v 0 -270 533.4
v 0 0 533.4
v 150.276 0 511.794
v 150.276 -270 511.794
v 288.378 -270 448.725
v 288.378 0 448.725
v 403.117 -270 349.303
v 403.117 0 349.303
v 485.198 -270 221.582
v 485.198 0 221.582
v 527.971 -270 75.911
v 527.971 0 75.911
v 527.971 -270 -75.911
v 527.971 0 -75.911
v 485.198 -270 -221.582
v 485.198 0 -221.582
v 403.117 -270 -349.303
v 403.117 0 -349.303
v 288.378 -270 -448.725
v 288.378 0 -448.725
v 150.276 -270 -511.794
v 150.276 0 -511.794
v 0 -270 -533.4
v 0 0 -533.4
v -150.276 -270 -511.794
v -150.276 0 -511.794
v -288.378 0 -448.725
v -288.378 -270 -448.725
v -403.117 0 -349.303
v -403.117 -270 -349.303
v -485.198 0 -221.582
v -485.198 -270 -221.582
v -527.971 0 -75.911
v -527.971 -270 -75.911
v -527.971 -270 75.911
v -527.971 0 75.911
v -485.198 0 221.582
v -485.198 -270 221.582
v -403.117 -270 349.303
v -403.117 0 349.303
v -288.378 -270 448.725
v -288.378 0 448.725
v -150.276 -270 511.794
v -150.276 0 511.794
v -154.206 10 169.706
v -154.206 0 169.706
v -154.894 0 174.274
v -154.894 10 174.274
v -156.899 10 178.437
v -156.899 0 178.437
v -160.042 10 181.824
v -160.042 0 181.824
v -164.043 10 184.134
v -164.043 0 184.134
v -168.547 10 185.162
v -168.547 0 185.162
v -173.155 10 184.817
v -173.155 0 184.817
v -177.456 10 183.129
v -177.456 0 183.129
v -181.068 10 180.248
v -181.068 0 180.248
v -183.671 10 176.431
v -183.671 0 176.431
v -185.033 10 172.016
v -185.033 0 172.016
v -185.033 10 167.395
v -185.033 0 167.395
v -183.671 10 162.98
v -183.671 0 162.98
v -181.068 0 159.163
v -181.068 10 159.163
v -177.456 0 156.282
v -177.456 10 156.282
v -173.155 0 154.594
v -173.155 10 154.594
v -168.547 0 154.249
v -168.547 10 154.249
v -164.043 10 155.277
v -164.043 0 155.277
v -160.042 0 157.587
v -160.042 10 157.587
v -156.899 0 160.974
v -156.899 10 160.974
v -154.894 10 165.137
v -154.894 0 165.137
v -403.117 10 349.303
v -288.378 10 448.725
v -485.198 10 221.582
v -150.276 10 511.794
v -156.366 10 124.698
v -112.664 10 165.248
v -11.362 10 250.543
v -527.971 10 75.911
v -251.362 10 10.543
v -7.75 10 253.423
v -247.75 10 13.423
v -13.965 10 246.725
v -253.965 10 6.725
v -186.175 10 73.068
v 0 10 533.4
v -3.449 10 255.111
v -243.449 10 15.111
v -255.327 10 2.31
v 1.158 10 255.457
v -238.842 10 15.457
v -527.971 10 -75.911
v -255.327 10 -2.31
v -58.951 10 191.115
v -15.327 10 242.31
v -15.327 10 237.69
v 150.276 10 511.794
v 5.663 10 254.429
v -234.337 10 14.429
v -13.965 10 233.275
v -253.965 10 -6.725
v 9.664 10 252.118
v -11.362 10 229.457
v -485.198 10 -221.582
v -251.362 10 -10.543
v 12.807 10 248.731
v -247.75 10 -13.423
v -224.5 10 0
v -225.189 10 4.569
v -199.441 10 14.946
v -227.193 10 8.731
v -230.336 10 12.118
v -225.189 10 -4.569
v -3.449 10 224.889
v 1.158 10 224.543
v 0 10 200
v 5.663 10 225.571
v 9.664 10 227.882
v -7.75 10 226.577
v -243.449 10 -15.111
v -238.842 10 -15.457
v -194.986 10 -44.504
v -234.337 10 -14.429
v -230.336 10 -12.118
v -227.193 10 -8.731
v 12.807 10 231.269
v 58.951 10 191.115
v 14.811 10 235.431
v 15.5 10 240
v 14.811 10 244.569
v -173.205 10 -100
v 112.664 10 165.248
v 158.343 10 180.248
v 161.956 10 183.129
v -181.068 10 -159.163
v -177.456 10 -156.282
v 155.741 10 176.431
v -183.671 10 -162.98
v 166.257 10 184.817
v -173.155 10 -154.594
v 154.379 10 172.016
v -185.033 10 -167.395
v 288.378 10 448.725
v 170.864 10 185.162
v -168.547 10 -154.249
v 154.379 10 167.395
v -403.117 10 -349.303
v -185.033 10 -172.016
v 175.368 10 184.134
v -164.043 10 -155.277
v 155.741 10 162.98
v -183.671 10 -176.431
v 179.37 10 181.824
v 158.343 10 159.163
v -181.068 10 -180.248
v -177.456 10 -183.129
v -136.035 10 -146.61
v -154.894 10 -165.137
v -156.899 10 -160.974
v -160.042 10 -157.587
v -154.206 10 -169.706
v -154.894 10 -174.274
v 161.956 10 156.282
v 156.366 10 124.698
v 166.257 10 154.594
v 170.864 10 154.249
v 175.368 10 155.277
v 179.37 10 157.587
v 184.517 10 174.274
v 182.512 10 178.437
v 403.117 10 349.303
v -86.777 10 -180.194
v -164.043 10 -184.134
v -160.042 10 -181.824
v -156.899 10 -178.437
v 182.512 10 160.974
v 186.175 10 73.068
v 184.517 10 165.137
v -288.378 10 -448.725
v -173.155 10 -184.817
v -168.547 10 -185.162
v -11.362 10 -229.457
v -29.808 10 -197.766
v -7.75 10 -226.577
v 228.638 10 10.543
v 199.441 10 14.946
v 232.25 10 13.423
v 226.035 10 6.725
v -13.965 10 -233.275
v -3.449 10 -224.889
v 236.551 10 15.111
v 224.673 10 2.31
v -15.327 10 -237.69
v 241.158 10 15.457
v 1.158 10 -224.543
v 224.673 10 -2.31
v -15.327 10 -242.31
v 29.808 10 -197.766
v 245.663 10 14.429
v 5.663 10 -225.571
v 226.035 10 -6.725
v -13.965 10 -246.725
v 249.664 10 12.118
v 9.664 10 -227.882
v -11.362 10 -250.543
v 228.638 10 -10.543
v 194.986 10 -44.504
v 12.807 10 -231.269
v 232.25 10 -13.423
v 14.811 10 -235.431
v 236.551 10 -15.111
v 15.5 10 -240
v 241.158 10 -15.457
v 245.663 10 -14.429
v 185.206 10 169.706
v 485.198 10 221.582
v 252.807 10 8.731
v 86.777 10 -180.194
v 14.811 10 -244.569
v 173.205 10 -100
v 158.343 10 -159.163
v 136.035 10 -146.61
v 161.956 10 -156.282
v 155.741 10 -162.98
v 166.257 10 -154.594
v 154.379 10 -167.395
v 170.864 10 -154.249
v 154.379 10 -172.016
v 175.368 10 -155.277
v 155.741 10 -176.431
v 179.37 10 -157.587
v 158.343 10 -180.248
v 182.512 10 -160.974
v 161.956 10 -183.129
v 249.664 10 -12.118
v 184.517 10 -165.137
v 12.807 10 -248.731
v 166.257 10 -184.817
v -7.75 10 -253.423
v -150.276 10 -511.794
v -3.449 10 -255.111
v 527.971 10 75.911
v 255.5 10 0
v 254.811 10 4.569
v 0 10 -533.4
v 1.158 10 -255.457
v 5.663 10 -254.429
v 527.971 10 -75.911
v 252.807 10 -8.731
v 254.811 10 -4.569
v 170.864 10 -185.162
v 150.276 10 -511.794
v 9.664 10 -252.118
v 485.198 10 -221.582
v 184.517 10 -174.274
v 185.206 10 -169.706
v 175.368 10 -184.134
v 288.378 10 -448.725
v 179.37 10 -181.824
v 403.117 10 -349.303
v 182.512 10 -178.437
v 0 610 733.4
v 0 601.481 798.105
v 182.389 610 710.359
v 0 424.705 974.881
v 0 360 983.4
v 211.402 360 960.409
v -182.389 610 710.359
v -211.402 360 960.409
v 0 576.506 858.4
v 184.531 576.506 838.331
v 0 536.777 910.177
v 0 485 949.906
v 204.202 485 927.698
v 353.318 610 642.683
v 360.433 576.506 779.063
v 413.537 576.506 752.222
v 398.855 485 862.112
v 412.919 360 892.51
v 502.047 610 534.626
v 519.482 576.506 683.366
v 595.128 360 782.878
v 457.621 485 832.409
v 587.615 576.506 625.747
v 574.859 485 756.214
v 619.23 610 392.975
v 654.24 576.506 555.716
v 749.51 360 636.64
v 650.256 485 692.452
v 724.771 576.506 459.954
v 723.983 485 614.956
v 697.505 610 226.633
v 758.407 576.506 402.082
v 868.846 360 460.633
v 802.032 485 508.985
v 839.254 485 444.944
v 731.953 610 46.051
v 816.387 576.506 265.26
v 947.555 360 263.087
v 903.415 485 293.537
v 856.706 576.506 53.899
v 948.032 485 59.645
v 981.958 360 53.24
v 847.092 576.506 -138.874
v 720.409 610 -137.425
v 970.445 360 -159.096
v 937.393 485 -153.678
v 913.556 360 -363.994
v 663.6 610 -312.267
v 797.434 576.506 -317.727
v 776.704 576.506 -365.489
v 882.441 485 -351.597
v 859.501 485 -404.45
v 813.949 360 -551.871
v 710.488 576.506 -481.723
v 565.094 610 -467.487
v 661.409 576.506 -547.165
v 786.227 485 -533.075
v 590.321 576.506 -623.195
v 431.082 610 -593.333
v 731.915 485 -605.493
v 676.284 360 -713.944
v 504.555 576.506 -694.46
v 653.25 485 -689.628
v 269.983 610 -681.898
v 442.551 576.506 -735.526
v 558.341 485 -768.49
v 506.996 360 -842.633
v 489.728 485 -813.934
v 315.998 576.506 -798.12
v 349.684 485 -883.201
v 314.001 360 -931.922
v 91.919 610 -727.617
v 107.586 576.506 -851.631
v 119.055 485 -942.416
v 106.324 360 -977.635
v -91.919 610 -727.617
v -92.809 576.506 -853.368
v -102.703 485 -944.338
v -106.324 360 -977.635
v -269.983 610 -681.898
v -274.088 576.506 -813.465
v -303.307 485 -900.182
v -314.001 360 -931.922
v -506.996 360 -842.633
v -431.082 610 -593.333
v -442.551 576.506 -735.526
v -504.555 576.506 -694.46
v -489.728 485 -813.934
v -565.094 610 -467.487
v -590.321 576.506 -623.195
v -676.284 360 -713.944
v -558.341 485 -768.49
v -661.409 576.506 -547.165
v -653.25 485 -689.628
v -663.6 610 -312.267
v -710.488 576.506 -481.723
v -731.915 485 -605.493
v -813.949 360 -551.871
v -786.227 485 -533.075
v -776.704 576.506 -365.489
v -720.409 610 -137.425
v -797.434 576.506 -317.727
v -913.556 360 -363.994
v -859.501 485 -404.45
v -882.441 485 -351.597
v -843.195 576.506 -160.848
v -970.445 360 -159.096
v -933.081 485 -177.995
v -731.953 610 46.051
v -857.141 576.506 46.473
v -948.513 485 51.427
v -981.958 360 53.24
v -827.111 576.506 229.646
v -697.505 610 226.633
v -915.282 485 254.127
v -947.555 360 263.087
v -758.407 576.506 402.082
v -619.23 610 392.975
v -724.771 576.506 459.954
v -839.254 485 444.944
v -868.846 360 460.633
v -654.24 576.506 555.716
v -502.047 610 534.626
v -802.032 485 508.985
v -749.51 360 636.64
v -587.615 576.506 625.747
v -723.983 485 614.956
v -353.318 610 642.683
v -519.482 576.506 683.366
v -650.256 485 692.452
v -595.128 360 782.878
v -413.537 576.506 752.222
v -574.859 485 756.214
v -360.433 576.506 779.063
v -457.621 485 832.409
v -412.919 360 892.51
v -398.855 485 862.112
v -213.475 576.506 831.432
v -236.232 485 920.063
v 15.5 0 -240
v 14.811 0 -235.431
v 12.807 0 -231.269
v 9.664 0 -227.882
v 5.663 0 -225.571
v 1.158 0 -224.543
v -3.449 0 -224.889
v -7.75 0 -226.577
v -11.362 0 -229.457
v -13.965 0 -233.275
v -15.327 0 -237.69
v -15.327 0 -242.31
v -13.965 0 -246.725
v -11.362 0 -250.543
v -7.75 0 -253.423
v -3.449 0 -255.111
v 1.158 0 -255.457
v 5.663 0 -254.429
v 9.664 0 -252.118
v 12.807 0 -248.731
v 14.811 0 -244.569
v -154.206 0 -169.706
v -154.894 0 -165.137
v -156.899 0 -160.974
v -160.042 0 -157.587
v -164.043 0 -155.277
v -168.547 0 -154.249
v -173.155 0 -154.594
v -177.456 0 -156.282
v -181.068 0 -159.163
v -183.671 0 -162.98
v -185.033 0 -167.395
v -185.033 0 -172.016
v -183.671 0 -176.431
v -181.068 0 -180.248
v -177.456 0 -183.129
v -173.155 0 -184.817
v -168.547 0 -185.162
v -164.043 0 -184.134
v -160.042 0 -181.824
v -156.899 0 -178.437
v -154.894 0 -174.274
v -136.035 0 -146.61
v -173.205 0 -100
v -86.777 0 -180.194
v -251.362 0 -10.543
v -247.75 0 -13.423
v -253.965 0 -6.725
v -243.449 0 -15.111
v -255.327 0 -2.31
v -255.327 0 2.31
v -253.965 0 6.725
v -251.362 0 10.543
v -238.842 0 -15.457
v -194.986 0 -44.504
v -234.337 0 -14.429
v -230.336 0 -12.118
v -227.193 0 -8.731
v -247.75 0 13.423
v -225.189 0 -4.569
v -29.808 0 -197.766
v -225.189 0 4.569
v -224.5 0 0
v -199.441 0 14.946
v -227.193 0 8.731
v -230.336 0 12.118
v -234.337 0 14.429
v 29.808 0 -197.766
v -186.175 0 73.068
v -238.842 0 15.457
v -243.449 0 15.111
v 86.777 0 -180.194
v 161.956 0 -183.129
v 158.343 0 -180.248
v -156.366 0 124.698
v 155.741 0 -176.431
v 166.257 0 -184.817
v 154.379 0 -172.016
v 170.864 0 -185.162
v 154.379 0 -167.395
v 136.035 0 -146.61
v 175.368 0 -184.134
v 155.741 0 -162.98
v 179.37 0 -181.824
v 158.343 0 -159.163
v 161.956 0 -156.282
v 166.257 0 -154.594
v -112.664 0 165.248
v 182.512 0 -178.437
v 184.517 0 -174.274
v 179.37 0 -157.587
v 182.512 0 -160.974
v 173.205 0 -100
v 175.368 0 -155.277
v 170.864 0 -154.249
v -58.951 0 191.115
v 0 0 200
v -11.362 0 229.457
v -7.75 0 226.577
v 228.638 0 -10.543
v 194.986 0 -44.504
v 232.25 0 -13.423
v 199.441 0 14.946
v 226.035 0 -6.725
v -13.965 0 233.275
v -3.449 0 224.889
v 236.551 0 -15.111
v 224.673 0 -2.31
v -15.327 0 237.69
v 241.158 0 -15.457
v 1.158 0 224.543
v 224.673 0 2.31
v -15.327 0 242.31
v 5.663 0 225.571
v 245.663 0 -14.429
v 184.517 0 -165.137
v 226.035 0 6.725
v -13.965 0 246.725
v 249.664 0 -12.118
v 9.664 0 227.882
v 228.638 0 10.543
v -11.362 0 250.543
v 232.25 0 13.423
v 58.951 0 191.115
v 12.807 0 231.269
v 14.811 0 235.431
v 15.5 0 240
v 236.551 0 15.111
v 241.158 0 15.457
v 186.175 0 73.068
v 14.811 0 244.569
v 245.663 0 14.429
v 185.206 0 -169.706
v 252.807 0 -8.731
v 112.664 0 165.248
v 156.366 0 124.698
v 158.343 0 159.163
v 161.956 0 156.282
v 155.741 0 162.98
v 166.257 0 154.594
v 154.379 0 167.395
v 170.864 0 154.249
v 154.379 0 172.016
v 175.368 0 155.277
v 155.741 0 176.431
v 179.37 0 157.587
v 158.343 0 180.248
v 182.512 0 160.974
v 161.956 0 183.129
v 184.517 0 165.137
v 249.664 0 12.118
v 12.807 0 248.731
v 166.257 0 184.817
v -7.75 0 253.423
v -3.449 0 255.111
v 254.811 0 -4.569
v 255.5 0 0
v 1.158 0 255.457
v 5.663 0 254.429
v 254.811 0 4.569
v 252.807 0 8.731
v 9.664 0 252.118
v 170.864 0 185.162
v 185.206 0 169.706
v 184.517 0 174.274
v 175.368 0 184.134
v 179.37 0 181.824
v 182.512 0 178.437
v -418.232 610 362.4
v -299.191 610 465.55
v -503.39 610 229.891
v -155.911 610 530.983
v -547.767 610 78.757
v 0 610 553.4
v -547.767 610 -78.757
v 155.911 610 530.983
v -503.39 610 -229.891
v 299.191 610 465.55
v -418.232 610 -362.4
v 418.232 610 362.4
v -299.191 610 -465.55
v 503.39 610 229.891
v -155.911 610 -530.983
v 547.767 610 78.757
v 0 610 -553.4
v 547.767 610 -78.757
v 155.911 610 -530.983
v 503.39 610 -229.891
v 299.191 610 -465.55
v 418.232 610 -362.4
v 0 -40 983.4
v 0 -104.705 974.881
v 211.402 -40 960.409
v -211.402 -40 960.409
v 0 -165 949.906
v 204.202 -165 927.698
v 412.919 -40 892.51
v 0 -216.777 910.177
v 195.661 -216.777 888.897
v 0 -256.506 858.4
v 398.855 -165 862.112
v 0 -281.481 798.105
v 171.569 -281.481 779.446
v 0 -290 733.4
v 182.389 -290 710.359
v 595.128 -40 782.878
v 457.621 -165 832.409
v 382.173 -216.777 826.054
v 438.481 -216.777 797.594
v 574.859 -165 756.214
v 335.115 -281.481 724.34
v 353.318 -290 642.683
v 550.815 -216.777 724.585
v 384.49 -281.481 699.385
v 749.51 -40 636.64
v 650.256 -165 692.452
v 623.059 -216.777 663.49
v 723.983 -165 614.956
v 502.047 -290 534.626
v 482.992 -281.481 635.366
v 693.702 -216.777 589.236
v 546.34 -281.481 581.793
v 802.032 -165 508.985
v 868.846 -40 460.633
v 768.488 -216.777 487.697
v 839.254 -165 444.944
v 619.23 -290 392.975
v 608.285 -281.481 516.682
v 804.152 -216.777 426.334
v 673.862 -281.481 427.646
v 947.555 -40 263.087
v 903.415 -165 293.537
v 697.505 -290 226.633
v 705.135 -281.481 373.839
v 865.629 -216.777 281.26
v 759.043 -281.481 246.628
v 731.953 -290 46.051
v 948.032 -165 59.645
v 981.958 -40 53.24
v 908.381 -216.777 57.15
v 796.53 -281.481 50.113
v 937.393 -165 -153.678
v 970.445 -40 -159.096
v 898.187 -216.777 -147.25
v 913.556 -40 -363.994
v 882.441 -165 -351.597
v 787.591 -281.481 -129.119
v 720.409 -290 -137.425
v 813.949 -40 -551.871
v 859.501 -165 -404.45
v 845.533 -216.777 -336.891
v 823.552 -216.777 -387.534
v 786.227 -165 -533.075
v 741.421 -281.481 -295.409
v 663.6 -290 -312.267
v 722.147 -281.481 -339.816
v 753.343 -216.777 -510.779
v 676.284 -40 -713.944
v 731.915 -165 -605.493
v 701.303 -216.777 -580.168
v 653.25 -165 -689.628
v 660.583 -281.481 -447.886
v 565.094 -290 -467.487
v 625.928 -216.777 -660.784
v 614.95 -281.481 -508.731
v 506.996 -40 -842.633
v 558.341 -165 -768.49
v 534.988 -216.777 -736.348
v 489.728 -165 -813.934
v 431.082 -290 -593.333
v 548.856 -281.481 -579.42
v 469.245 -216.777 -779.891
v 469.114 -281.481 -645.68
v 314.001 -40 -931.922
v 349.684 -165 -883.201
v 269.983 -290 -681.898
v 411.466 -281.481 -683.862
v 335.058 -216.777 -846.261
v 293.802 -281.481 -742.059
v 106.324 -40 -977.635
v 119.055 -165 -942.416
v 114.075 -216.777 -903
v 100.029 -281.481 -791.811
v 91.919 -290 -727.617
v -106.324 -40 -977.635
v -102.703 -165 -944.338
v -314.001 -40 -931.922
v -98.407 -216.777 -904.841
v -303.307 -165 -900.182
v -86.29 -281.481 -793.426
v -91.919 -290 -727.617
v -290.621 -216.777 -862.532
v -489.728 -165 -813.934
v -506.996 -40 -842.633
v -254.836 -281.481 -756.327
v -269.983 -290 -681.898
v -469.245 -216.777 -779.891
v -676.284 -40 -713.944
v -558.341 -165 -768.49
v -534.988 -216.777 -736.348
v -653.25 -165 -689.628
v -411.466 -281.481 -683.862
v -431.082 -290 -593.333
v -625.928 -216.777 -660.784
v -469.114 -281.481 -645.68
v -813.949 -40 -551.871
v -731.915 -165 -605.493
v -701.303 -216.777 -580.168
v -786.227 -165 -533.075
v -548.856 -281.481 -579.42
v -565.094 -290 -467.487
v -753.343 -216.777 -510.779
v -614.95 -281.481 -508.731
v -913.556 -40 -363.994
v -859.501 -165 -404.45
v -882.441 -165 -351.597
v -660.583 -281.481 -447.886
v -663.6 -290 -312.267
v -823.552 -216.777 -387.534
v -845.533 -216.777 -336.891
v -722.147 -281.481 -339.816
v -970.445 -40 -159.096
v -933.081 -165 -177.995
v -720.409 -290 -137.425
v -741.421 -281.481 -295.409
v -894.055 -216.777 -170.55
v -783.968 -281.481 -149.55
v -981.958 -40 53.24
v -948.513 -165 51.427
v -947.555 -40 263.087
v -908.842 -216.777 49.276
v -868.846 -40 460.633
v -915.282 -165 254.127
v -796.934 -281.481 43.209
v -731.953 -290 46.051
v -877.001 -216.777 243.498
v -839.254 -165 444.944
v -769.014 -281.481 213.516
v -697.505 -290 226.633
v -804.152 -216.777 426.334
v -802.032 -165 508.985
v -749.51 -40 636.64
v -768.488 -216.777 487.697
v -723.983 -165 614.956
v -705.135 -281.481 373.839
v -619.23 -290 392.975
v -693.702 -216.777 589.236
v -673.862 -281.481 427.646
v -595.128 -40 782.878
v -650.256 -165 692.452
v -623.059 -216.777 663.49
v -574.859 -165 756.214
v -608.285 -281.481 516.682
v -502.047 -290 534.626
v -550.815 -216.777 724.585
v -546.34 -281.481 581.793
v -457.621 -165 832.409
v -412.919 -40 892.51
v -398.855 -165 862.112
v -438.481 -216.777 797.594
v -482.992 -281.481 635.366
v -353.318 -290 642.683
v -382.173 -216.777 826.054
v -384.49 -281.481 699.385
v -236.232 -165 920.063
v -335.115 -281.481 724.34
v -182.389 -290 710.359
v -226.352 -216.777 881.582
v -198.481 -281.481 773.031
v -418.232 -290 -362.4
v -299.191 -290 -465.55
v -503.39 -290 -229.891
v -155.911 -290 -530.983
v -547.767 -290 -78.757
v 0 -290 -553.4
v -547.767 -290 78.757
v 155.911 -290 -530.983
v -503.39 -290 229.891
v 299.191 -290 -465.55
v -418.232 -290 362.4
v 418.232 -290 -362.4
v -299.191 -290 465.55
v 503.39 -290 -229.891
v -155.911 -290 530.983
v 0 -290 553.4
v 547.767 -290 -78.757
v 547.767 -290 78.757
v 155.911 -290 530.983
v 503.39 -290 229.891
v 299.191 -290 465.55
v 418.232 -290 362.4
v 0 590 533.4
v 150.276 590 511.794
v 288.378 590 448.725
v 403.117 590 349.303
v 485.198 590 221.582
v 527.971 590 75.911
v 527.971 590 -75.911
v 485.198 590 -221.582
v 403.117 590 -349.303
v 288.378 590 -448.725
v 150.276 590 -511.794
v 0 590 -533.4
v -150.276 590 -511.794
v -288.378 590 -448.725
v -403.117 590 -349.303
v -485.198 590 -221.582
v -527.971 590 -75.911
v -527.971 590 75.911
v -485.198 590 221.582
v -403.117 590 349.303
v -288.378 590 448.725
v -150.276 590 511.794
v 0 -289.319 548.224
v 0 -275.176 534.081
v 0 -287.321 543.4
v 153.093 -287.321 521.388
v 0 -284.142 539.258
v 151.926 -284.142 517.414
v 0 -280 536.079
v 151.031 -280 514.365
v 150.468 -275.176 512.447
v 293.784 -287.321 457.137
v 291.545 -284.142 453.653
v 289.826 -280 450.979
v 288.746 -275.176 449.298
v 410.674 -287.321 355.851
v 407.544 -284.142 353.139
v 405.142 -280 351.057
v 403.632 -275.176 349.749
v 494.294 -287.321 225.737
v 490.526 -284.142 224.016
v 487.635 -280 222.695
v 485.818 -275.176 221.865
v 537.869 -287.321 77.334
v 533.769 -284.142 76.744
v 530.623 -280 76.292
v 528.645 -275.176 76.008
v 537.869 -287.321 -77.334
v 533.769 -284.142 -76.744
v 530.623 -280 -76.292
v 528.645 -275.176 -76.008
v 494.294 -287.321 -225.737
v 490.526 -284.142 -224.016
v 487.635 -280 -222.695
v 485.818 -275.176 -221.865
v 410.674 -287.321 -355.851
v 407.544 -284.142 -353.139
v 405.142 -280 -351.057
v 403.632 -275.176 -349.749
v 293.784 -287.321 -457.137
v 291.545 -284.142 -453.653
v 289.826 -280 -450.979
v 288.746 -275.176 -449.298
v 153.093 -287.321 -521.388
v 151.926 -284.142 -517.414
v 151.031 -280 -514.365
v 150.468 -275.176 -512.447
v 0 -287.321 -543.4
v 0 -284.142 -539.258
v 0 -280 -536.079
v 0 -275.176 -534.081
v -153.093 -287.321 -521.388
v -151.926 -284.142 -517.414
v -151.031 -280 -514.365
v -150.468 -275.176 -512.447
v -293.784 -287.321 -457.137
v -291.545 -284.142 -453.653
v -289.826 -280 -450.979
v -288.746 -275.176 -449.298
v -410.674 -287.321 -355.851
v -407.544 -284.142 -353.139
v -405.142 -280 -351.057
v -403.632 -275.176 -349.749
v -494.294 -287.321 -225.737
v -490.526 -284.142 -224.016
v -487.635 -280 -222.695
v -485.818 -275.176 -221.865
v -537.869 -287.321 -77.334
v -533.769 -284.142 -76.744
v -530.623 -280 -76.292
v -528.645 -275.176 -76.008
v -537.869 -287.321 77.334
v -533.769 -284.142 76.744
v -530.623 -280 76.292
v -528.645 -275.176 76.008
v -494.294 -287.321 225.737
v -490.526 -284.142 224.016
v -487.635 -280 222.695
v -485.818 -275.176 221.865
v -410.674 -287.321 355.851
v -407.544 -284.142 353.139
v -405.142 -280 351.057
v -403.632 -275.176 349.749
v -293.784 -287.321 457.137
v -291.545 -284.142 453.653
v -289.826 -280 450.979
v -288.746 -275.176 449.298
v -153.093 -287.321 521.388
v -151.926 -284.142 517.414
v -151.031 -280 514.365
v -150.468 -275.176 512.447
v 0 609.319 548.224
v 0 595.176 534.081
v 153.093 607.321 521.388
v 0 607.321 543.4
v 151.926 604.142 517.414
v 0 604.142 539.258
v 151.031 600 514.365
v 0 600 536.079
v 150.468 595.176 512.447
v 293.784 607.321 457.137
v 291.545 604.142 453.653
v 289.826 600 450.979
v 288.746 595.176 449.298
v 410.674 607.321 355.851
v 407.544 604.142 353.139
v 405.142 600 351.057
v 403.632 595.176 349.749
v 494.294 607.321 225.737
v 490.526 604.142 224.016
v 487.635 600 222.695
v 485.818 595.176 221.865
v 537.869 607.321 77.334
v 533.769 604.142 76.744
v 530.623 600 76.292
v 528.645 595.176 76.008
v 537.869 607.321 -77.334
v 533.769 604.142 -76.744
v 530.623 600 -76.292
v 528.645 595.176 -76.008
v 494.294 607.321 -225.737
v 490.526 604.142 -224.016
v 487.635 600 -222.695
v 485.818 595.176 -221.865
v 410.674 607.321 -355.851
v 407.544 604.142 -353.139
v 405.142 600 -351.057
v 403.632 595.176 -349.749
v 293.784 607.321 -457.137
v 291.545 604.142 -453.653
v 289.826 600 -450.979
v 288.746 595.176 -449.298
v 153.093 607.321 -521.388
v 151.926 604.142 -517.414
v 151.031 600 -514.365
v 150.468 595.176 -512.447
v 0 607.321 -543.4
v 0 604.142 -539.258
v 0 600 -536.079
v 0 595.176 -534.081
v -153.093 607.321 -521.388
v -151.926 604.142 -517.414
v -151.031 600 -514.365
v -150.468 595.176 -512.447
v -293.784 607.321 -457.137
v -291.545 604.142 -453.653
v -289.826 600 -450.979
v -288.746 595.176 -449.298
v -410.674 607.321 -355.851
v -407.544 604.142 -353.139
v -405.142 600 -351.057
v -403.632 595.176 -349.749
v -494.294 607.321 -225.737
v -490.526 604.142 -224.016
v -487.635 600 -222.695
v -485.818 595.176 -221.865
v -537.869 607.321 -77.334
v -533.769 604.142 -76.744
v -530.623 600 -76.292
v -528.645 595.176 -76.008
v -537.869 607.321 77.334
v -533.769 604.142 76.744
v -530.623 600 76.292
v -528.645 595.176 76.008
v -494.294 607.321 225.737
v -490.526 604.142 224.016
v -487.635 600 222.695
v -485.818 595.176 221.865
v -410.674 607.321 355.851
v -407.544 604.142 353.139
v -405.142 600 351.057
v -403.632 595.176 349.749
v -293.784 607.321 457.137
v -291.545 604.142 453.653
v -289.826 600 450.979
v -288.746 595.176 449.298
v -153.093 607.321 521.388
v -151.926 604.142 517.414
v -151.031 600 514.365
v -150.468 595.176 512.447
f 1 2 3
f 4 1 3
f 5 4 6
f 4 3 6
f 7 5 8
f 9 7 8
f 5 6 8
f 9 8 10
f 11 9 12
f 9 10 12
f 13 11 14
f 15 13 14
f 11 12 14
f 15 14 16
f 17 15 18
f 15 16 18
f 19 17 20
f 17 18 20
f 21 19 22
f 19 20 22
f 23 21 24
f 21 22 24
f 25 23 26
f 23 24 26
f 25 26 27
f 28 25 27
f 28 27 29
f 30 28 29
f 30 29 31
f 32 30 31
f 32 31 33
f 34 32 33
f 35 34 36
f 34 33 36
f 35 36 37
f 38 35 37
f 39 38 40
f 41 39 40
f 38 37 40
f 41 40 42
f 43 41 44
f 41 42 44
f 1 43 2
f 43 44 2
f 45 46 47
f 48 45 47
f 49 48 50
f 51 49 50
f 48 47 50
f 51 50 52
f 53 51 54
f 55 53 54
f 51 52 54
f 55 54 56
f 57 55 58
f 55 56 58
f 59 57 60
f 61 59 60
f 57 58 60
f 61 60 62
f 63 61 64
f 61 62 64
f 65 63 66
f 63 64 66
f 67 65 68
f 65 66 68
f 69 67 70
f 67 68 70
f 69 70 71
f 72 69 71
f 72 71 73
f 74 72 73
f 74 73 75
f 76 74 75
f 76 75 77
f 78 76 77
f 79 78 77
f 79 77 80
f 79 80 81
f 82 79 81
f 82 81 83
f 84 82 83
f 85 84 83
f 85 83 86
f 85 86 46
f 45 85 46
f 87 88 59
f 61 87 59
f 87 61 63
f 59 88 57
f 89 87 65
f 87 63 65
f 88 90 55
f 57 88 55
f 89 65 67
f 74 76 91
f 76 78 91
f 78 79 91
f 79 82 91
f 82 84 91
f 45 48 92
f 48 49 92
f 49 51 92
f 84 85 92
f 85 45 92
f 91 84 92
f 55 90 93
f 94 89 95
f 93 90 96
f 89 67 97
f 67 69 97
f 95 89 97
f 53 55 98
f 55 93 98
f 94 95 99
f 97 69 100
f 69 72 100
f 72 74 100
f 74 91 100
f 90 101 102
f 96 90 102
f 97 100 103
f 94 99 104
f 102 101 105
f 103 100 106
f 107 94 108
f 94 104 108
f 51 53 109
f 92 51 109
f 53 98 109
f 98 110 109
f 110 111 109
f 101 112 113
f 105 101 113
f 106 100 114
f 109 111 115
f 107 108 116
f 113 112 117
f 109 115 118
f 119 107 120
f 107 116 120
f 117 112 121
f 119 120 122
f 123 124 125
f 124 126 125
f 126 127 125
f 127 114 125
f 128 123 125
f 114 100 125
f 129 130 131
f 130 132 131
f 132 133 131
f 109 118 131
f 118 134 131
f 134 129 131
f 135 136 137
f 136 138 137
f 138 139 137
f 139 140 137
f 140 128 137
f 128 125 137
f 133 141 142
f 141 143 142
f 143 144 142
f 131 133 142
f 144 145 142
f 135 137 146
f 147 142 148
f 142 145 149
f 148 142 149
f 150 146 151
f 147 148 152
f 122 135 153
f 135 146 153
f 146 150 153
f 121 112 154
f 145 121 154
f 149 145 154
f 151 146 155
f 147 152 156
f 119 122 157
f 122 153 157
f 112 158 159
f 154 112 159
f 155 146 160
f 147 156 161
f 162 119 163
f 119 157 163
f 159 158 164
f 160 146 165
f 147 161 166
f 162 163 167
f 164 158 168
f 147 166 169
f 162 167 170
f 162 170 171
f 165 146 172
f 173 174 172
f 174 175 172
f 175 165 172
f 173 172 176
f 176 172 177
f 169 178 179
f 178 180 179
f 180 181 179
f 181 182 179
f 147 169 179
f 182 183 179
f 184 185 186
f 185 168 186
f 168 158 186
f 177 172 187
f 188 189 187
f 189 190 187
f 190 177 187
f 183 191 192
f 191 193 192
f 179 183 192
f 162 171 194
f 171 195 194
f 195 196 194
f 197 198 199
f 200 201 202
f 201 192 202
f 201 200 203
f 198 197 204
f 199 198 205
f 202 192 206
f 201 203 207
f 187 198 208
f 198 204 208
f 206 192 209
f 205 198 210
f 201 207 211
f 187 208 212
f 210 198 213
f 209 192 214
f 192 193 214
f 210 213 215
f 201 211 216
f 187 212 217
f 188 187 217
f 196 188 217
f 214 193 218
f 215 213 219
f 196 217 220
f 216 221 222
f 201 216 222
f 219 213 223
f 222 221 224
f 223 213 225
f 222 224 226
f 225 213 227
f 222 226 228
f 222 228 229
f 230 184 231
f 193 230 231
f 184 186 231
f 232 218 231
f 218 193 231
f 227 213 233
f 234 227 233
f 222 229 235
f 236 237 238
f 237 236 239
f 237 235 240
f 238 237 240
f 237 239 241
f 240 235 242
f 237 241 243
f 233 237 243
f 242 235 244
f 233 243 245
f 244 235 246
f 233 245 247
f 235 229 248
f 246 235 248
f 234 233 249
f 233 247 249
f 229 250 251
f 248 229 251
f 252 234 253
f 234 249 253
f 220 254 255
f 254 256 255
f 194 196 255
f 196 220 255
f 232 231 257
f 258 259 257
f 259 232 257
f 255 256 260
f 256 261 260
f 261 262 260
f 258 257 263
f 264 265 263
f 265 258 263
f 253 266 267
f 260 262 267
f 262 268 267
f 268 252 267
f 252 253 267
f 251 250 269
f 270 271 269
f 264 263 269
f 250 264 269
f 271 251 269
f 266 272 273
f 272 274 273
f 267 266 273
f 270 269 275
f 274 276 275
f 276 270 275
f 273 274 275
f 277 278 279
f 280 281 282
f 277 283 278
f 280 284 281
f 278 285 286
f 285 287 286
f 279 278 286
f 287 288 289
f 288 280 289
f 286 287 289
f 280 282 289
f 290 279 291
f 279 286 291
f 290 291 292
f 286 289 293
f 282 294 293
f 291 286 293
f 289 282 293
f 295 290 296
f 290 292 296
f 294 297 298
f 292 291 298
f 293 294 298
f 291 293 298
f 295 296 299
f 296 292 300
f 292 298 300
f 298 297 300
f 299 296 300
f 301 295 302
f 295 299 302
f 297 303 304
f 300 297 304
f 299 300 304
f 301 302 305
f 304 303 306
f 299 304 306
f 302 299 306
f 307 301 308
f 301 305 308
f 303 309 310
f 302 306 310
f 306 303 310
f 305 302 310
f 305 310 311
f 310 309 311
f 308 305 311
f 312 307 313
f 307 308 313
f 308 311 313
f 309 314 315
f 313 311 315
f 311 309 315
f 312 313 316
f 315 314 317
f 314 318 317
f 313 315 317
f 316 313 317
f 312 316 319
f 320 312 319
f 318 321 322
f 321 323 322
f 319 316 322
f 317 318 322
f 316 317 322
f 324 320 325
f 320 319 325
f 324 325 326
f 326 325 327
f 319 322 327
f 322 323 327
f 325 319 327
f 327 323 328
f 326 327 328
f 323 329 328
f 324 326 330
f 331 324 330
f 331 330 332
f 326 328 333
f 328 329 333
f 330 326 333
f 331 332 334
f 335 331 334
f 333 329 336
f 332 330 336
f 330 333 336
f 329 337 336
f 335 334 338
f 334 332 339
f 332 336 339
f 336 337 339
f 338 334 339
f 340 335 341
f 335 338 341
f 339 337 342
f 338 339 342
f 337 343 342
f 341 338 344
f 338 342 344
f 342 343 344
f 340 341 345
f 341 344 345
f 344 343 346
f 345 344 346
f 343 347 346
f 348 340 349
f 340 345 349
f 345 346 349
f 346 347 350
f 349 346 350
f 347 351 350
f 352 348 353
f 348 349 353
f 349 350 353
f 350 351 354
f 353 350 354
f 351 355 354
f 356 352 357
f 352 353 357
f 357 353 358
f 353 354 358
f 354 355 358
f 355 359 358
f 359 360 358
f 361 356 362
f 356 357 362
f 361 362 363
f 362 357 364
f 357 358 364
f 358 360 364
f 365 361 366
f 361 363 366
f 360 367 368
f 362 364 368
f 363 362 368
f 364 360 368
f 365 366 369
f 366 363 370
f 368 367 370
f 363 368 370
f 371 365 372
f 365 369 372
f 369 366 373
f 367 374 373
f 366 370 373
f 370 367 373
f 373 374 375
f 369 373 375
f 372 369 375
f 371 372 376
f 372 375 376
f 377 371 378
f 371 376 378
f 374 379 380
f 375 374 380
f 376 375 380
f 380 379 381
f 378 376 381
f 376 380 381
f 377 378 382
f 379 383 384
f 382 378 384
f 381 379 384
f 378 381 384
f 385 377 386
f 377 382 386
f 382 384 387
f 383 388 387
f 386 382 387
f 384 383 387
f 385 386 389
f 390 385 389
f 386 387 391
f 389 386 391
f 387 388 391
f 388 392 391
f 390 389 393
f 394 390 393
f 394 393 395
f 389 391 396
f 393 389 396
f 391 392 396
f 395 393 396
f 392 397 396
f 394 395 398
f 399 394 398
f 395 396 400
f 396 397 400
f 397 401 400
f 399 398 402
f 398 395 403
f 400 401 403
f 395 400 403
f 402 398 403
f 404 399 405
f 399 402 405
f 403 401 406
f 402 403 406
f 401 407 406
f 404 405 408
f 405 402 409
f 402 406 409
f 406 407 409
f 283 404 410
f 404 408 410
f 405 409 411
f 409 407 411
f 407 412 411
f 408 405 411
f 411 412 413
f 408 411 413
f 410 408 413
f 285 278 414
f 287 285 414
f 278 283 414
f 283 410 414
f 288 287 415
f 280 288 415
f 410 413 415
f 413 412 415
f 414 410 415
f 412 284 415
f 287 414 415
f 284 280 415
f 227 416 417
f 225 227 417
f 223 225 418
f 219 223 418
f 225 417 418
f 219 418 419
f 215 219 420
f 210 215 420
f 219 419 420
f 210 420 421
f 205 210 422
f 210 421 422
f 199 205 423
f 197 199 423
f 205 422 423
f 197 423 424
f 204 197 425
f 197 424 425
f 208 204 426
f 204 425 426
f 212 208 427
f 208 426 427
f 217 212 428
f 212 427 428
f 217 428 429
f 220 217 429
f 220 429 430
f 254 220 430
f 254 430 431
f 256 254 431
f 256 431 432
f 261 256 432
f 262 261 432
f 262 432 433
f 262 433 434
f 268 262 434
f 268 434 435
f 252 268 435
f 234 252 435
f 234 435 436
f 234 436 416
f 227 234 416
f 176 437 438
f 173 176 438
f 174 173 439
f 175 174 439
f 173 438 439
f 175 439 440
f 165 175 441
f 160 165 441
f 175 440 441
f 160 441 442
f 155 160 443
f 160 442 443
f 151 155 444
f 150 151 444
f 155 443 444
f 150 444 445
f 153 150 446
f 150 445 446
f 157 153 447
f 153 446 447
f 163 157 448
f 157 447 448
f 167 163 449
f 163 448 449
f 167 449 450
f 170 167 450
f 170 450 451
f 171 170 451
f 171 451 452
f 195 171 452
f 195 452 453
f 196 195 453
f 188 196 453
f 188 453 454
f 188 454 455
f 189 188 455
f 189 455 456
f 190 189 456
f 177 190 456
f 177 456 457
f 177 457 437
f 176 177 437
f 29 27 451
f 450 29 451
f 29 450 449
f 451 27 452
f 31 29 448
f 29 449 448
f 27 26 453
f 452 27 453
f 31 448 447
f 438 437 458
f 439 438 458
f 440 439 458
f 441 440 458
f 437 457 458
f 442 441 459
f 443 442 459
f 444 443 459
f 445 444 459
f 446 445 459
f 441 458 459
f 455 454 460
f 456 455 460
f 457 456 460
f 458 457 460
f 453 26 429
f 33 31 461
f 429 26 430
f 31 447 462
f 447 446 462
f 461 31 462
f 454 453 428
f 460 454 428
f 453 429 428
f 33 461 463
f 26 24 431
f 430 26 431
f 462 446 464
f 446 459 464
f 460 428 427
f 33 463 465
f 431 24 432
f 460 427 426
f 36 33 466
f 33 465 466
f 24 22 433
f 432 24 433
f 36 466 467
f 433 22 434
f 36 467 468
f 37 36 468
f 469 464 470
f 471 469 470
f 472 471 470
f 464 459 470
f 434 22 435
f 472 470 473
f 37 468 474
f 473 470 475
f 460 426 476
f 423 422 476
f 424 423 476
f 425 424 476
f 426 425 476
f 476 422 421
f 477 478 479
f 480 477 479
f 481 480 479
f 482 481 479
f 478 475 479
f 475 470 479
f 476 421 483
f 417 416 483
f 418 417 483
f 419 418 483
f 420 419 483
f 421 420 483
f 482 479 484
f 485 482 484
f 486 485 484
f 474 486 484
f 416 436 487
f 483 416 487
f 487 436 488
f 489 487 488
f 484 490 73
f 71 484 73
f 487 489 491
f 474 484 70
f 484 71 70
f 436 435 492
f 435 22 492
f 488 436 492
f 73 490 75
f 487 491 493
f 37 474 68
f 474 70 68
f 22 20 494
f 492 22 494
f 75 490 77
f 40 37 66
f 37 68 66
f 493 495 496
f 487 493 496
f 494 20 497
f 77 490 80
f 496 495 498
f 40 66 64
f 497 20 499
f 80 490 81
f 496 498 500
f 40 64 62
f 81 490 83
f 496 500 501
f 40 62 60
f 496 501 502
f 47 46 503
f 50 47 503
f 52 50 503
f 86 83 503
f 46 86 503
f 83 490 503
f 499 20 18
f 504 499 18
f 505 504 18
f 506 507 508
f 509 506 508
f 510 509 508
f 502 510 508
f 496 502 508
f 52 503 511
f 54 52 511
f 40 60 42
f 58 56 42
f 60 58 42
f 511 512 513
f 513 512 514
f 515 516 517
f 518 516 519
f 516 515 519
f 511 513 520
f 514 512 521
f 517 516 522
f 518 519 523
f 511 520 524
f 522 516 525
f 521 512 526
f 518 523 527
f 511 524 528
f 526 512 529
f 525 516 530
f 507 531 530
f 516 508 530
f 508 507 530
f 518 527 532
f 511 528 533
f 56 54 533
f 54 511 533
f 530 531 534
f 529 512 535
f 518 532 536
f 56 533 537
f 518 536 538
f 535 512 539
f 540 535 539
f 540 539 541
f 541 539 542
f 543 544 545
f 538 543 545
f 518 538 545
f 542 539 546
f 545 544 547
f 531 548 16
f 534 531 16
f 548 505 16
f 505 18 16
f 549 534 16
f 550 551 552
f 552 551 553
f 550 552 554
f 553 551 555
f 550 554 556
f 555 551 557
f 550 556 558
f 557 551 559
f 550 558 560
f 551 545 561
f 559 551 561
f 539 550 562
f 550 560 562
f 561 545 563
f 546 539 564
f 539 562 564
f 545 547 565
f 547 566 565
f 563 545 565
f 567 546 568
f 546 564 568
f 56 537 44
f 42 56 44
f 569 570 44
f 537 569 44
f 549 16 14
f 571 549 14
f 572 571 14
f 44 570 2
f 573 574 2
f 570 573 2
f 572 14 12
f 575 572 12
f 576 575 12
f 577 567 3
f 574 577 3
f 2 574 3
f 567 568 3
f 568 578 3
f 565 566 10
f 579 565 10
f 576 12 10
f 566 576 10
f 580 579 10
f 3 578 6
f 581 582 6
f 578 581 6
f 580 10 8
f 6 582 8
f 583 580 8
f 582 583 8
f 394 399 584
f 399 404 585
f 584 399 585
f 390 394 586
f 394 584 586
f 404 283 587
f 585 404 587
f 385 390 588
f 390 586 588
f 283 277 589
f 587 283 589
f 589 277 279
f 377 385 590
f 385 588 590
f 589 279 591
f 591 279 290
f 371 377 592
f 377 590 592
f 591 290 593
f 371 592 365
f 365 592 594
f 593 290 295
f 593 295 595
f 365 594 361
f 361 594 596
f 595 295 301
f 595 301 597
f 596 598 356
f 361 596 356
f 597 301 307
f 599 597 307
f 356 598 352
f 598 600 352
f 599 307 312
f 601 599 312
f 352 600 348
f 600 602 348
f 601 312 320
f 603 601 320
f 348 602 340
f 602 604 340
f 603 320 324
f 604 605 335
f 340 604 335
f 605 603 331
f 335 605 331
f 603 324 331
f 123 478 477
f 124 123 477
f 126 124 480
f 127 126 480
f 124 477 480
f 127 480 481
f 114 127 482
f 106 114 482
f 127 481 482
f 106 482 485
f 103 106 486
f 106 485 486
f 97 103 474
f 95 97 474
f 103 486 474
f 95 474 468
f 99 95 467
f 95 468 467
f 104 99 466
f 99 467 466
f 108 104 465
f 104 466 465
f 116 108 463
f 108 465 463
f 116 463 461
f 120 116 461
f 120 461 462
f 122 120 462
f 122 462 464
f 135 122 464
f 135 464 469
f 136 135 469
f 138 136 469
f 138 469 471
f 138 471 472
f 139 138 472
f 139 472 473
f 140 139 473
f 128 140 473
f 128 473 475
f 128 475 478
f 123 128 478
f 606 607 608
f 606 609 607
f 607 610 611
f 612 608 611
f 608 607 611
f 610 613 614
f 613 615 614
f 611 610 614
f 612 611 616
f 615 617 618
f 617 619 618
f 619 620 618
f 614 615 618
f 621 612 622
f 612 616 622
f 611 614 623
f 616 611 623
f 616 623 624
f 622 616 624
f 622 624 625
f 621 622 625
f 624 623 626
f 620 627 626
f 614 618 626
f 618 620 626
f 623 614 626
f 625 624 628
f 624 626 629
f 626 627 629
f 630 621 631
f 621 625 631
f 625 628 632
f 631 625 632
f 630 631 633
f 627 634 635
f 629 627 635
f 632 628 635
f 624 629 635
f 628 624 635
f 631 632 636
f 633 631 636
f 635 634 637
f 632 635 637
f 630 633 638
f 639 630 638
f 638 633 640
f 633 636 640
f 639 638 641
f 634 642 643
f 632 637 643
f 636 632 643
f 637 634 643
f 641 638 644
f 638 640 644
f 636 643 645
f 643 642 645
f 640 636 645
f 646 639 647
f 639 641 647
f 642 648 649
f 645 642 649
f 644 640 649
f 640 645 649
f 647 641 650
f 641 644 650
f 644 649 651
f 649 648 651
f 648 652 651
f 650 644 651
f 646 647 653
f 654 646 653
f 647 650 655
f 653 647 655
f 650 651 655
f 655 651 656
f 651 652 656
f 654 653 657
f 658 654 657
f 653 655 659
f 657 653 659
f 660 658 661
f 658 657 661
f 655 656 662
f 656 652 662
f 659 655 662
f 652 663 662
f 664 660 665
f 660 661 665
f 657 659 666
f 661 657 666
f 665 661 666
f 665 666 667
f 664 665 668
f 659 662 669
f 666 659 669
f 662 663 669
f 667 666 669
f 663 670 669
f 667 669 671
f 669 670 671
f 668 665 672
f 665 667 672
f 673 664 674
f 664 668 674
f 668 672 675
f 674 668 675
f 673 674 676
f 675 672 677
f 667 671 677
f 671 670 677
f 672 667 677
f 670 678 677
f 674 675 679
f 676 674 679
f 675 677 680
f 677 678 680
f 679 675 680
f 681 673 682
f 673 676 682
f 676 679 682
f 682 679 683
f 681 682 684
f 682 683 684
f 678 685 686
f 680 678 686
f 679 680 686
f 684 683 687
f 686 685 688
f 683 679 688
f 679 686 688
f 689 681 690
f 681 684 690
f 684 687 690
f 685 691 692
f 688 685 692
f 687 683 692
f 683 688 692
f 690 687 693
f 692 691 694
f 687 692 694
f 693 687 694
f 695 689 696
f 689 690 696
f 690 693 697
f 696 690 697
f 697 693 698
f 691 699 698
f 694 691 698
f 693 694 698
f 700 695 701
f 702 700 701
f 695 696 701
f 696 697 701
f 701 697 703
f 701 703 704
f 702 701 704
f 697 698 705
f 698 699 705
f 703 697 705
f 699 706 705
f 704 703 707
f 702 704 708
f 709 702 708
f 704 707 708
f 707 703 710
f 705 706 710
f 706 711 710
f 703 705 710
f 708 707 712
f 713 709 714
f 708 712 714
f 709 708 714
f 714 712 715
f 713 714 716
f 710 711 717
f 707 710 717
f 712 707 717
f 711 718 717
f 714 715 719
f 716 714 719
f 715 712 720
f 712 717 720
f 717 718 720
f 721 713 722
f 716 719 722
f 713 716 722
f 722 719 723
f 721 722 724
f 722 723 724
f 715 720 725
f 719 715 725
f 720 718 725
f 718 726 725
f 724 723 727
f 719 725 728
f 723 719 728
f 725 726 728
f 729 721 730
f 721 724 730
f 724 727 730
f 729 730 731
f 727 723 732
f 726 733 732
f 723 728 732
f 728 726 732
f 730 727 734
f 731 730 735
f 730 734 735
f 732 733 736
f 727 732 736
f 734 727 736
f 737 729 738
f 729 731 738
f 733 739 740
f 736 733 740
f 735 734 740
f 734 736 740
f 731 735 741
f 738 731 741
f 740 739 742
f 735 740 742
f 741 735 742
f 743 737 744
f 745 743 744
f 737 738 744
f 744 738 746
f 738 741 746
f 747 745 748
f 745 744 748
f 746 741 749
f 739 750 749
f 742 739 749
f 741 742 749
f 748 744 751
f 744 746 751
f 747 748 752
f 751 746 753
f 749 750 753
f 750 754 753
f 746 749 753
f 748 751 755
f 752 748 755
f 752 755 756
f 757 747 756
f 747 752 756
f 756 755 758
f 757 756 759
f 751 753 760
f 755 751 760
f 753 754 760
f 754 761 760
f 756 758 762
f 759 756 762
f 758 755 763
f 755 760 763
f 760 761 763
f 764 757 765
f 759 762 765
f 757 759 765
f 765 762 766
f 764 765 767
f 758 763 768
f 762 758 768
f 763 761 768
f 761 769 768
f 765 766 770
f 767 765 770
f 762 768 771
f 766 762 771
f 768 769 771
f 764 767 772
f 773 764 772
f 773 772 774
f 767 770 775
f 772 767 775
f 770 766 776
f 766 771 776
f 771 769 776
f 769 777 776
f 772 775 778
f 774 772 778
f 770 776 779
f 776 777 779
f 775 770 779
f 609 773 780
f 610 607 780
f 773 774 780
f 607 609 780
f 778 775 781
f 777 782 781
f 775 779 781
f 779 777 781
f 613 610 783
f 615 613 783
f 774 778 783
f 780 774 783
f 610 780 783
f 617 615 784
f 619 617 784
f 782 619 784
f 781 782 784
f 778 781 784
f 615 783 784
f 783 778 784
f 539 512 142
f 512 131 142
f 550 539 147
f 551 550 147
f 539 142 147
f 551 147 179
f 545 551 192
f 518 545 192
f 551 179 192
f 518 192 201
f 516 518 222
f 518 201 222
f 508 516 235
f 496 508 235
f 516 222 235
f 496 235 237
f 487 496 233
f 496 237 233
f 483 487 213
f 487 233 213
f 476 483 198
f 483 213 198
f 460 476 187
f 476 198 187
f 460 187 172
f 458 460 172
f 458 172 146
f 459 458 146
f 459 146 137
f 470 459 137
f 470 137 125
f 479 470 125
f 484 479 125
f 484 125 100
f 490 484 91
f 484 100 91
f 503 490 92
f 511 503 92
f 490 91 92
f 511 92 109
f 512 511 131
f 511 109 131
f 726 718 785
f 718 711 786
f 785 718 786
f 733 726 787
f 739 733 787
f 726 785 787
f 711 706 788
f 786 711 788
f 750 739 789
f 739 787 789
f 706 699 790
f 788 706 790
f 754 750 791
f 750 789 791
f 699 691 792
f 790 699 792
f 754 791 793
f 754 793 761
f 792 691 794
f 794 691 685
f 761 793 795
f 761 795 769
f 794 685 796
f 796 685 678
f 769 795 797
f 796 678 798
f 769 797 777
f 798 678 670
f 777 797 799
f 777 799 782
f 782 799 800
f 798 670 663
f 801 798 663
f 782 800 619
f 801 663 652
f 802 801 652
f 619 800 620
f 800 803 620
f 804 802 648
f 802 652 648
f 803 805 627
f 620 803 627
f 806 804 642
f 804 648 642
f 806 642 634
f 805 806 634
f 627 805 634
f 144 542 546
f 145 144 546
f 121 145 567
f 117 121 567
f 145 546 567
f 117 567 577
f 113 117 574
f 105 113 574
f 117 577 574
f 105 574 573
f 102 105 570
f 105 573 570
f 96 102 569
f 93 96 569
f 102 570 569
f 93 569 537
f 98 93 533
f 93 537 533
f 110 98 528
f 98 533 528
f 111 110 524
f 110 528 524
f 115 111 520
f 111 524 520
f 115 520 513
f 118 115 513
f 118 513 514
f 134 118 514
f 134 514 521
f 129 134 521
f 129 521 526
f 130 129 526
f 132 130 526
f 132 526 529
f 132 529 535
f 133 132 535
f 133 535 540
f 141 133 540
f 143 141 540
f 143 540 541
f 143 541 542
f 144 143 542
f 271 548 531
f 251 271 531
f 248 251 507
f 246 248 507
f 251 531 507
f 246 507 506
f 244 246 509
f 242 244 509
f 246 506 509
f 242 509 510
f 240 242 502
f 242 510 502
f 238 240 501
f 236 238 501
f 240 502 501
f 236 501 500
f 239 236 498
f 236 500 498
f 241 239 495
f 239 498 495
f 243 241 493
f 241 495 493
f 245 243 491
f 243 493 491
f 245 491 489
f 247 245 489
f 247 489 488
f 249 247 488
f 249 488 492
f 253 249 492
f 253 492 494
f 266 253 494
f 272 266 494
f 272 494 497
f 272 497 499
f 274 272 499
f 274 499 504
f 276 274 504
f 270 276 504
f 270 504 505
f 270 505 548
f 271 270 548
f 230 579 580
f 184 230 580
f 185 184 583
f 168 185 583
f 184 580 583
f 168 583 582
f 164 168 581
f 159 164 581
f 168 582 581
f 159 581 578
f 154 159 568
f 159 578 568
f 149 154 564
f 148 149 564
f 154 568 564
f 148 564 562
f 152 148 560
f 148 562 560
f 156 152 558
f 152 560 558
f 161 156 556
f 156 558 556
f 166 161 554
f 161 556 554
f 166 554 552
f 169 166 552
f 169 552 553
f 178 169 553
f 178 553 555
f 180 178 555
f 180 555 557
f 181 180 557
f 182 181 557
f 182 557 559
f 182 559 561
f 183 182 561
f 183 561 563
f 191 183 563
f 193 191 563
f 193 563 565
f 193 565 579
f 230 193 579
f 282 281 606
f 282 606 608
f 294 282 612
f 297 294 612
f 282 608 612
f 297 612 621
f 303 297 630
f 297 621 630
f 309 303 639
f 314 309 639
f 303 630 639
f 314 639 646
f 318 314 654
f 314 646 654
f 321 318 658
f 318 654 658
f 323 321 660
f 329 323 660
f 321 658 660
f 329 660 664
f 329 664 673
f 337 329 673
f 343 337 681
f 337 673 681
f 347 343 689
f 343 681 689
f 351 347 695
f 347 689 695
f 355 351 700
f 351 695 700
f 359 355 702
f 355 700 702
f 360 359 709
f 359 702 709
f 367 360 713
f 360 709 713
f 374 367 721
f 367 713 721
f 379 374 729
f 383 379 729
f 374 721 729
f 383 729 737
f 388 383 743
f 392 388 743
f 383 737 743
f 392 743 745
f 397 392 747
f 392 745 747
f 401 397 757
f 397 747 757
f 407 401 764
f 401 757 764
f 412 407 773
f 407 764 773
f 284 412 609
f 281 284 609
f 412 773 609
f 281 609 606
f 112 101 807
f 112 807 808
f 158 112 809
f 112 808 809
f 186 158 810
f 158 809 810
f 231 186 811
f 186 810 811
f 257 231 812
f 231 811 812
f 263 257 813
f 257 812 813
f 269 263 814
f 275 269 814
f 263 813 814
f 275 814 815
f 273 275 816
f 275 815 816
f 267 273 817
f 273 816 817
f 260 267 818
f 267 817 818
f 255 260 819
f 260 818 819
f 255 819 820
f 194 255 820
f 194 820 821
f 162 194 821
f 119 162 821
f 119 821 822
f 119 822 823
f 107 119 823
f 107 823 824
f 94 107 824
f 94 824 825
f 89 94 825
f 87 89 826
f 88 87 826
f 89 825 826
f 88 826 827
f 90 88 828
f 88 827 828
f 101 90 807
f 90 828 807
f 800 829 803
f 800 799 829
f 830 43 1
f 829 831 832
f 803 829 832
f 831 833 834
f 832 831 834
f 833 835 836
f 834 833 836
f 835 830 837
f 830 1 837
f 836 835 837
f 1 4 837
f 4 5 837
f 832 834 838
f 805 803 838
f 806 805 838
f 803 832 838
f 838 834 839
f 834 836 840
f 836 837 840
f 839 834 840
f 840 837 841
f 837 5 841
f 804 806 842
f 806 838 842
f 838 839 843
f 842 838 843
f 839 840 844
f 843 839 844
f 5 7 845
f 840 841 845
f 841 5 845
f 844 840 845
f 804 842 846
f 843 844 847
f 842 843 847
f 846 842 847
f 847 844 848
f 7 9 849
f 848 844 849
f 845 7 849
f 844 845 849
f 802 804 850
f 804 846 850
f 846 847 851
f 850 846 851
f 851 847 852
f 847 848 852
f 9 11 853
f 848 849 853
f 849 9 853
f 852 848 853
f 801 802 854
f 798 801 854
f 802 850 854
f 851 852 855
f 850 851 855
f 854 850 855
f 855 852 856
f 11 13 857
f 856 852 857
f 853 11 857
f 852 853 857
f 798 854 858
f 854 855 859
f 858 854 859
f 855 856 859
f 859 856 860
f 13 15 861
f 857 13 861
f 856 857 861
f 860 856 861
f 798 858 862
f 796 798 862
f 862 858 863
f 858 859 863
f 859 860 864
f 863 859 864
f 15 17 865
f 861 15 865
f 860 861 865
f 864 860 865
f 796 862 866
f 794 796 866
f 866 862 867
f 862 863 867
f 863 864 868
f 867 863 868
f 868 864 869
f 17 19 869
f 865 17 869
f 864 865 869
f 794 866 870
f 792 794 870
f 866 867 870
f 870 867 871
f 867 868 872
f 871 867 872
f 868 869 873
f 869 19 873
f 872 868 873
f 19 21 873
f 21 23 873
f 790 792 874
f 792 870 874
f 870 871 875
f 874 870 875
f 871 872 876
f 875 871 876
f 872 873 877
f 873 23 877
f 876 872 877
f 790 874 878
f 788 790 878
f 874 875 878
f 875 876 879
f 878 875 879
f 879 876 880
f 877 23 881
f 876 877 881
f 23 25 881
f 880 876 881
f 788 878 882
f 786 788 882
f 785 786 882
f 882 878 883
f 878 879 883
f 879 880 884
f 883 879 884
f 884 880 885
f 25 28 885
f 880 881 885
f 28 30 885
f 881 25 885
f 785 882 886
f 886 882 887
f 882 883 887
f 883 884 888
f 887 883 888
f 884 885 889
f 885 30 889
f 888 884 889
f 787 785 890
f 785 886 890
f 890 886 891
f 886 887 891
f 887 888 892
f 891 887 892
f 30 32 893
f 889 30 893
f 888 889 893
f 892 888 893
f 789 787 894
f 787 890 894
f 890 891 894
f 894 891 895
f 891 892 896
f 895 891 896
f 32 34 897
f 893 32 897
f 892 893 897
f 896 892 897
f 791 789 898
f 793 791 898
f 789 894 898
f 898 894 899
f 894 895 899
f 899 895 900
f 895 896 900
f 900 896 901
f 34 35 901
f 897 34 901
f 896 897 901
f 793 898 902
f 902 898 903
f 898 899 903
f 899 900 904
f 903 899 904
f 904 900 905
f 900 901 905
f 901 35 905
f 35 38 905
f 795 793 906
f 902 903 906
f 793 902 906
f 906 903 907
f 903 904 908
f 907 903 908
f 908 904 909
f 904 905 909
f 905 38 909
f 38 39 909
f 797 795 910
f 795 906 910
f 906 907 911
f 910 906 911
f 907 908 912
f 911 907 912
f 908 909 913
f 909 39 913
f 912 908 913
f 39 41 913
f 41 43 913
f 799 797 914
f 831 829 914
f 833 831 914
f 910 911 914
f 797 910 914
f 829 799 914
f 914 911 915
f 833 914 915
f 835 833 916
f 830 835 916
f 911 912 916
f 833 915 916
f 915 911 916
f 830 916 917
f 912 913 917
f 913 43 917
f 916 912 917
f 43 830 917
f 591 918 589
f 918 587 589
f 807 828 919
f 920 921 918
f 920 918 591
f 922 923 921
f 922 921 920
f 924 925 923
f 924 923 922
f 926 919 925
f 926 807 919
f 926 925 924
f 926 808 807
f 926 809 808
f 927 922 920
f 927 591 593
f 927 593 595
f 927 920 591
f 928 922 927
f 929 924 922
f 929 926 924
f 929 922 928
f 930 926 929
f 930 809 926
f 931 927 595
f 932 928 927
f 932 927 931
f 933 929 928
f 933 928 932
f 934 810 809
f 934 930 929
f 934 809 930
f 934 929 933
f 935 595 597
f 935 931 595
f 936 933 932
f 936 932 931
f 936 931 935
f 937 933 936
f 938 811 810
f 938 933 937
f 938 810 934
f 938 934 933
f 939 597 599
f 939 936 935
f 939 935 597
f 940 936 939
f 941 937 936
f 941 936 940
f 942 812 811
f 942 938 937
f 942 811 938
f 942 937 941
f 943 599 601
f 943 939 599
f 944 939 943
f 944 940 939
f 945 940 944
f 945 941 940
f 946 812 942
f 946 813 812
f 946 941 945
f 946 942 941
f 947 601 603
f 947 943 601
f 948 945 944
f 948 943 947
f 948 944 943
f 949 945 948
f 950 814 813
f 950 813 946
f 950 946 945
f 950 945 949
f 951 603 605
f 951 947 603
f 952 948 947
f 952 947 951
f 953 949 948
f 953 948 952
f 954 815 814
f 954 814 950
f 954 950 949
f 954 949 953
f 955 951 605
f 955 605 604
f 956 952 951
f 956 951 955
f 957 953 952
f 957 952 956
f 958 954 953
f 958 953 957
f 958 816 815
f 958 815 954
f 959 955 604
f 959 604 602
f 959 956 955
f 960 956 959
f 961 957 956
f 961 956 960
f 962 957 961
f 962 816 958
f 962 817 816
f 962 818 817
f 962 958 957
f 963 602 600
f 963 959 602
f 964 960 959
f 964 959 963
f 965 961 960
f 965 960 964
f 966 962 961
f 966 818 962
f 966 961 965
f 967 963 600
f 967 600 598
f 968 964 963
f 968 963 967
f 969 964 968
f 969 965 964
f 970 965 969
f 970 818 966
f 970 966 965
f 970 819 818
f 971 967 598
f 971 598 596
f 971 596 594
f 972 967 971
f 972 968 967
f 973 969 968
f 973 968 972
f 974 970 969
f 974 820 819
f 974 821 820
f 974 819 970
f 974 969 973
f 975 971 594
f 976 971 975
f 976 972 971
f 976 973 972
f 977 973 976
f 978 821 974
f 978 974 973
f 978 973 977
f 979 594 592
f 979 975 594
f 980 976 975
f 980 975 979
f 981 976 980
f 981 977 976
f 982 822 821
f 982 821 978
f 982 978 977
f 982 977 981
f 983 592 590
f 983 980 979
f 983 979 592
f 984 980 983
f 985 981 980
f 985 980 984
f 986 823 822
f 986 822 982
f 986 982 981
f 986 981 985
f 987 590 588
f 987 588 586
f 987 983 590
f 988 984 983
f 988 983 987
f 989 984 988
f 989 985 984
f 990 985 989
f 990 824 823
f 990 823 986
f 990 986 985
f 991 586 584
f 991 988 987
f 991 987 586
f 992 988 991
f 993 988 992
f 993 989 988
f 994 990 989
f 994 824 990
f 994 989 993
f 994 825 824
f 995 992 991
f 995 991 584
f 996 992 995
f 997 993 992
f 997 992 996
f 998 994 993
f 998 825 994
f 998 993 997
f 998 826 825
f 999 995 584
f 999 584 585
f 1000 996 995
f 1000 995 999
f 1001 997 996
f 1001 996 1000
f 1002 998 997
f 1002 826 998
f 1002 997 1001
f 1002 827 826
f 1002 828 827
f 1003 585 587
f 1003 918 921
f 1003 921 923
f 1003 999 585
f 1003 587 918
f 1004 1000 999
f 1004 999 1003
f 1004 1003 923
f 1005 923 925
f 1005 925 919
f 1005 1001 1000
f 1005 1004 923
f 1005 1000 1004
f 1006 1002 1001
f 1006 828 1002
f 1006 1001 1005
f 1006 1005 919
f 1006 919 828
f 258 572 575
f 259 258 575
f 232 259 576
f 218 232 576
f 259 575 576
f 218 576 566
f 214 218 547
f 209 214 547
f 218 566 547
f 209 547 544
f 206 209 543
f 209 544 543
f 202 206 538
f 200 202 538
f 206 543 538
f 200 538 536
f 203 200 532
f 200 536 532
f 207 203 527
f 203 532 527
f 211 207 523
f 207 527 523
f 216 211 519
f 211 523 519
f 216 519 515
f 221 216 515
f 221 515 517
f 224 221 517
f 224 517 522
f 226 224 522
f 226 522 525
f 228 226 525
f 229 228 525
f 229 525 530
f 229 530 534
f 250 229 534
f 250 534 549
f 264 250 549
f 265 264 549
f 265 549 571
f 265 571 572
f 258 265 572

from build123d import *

# Parameters (mm, degrees)
F2_R     = 250
F3_R     = 20
F4_R     = 15.5
F5_DEPTH = 25


with BuildPart() as f1:
    # F0 (on Right) → F1 (revolve)
    with BuildSketch(Plane.YZ):
        Polygon((0, 533.4), (0, 200), (10, 200), (10, 533.4), (610, 533.4), (610, 983.4), (-290, 983.4), (-290, 533.4), align=None)
    revolve(axis=Axis((0, 333.333626, 0), (0, 1, 0)))

    # F2
    f2_edges = [f1.edges().sort_by_distance(p)[0] for p in [
        (0, -290, -983.4),
        (0, 610, -983.4),
    ]]
    fillet(f2_edges, radius=F2_R)

    # F3
    f3_edges = [f1.edges().sort_by_distance(p)[0] for p in [
        (0, -290, -533.4),
        (0, 610, -533.4),
    ]]
    fillet(f3_edges, radius=F3_R)

    # F4 (on face) → F5 (cut)
    with BuildSketch(Plane.XZ):
        with Locations((0, 240)):
            Circle(F4_R)
        with Locations((-169.705627, 169.705627)):
            Circle(F4_R)
        with Locations((-240, 0)):
            Circle(F4_R)
        with Locations((-169.705627, -169.705627)):
            Circle(F4_R)
        with Locations((0, -240)):
            Circle(F4_R)
        with Locations((169.705627, -169.705627)):
            Circle(F4_R)
        with Locations((240, 0)):
            Circle(F4_R)
        with Locations((169.705627, 169.705627)):
            Circle(F4_R)
    extrude(amount=-F5_DEPTH, mode=Mode.SUBTRACT)


solid = f1.part
